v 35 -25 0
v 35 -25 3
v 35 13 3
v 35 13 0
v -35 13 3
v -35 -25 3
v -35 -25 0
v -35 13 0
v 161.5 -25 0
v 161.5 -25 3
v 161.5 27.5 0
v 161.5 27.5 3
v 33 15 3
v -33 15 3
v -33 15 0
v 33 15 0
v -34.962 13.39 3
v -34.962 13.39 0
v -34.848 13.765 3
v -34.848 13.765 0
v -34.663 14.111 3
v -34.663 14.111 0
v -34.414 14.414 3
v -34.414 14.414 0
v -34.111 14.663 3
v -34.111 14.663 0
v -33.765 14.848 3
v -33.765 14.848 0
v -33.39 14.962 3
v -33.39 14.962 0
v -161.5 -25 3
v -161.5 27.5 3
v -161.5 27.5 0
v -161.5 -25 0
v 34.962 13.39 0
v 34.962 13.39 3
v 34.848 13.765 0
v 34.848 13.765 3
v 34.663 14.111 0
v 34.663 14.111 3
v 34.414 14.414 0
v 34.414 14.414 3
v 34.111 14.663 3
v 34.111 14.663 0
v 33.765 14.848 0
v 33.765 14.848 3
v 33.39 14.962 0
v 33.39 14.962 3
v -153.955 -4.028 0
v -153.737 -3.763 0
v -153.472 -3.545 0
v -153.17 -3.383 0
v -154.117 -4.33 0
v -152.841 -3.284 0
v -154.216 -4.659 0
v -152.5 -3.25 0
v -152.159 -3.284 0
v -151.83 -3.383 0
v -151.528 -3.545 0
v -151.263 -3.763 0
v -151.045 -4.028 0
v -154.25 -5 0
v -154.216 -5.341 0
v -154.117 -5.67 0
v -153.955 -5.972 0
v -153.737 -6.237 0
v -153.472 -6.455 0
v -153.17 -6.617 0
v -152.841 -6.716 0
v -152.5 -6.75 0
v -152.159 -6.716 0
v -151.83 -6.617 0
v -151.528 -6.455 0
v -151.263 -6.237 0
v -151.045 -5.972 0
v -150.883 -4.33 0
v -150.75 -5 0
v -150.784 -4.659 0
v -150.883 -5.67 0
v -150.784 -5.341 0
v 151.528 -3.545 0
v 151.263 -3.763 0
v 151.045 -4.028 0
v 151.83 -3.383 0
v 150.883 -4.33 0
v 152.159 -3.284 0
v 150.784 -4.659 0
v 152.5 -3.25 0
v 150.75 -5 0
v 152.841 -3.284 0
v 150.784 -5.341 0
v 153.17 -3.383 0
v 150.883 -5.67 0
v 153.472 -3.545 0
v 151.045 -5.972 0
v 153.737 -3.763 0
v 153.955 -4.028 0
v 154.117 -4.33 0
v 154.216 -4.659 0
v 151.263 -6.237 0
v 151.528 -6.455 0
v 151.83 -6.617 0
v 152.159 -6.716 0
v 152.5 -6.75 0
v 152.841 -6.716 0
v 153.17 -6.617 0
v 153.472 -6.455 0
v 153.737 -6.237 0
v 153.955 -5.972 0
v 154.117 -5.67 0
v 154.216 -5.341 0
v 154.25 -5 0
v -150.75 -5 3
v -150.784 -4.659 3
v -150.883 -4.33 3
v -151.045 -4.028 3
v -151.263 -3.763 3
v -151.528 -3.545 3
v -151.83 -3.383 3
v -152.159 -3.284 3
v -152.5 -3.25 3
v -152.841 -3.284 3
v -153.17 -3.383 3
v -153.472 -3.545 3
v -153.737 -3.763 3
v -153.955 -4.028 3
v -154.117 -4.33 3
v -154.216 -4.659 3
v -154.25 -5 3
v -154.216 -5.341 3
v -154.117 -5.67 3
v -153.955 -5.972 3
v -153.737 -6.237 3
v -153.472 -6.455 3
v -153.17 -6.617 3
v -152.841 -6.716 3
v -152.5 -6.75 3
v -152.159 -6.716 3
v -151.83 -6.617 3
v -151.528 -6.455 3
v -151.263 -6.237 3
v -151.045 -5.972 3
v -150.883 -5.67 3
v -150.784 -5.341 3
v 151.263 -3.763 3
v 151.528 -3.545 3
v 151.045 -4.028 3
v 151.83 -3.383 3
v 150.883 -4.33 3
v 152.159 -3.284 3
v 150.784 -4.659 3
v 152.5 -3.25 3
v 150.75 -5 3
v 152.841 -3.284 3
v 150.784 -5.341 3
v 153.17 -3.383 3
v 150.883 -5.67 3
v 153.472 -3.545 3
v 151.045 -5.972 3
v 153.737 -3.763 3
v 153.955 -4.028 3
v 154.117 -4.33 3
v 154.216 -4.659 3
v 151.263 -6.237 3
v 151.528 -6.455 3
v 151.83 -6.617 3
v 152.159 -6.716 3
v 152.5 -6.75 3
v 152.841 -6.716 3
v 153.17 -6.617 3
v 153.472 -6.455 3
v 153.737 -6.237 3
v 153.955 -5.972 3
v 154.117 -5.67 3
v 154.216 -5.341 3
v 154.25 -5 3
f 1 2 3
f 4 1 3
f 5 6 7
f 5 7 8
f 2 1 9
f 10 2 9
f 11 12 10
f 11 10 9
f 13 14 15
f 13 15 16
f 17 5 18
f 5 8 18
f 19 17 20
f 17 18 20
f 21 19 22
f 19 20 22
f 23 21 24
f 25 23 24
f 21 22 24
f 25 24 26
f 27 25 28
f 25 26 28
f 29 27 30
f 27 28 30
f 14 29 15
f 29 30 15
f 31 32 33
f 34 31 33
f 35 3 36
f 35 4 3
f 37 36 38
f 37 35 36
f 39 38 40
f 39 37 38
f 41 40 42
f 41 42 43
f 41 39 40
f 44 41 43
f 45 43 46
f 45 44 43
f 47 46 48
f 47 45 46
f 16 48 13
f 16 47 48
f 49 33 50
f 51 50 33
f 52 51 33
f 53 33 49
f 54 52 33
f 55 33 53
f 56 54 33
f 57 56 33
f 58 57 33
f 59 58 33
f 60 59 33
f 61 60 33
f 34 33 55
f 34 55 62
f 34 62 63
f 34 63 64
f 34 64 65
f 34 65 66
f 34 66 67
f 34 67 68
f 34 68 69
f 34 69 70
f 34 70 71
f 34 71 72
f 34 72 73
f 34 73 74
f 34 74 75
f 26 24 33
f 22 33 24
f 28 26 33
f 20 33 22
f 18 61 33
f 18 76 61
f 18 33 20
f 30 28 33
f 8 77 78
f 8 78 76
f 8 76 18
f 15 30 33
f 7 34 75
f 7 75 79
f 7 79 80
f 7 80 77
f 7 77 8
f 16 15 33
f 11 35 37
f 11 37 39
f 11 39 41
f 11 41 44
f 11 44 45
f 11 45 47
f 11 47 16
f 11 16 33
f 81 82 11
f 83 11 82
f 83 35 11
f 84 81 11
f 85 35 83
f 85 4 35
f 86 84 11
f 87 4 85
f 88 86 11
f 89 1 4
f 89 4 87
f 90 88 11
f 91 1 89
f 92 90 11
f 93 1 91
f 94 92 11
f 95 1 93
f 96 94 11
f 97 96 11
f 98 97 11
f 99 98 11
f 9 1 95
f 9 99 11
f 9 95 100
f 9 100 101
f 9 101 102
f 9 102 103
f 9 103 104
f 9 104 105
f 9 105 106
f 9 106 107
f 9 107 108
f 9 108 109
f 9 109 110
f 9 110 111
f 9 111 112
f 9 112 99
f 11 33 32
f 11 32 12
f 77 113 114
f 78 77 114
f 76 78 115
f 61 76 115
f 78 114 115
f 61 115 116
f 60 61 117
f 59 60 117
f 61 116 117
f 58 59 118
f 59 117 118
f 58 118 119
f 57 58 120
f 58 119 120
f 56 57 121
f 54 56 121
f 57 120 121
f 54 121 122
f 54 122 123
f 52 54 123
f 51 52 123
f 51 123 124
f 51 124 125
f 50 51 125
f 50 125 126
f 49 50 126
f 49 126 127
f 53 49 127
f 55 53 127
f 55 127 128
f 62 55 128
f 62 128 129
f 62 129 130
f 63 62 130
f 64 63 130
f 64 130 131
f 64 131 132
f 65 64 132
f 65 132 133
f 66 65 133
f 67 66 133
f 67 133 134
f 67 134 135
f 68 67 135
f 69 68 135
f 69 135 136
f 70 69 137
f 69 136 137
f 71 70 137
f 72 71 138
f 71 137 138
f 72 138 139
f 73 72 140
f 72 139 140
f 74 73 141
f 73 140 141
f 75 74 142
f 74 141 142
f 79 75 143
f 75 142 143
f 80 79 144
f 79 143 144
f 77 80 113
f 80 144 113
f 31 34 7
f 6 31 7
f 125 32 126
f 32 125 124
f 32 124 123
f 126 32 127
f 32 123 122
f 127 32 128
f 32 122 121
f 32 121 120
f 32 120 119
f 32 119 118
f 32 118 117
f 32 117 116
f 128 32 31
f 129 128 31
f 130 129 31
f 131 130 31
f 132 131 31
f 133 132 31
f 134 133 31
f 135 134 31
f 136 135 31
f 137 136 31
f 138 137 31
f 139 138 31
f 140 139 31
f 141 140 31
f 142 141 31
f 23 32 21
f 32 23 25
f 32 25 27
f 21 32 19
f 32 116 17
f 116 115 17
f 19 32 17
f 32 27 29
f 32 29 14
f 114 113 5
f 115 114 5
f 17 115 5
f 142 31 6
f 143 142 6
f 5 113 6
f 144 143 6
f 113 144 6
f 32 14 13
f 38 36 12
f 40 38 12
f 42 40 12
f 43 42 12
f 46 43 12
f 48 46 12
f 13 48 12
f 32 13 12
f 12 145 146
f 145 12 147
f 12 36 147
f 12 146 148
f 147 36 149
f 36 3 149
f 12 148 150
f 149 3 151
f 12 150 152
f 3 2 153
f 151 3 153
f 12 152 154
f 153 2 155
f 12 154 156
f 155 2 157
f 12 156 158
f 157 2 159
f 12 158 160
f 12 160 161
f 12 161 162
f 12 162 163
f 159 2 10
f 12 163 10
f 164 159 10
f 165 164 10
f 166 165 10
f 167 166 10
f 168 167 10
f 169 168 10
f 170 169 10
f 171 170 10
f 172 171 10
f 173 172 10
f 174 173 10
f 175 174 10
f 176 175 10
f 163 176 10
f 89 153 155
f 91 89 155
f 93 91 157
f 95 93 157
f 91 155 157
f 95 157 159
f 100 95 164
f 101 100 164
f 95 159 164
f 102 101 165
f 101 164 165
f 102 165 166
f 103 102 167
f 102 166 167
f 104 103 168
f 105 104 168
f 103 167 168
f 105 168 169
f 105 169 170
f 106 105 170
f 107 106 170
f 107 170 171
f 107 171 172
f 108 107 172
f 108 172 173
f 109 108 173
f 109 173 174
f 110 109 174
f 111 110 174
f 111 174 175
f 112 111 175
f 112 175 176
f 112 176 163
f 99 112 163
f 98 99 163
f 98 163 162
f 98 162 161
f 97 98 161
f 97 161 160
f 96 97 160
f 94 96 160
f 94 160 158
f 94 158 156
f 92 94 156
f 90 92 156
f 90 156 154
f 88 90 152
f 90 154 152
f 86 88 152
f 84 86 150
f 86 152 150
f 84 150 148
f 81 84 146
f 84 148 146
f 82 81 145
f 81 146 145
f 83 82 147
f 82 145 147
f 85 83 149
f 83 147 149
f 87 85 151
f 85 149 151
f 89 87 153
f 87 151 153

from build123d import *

# Parameters (mm, degrees)
SKETCH1_W               = 323
SKETCH1_H               = 50
BOSS_EXTRUDE1_DEPTH     = 3
SKETCH2_W               = 70
SKETCH2_H               = 40
CUT_EXTRUDE1_DEPTH      = 1
CUT_EXTRUDE1_DEPTH_BACK = 4
FILLET1_R               = 2
SKETCH3_W               = 323
SKETCH3_H               = 3
BOSS_EXTRUDE2_DEPTH     = 2.5
SKETCH4_R               = 1.75
CUT_EXTRUDE2_DEPTH      = 4


with BuildPart() as part:
    # Sketch1 → Boss-Extrude1 (new body)
    with BuildSketch(Plane.XY):
        Rectangle(SKETCH1_W, SKETCH1_H)
    extrude(amount=BOSS_EXTRUDE1_DEPTH)

    # Sketch2 → Cut-Extrude1 (cut, two sides)
    with BuildSketch(Plane.XY.offset(3)) as cut_extrude1_sk:
        with Locations((0, -5)):
            Rectangle(SKETCH2_W, SKETCH2_H)
    extrude(amount=CUT_EXTRUDE1_DEPTH, mode=Mode.SUBTRACT)
    extrude(cut_extrude1_sk.sketch, amount=-CUT_EXTRUDE1_DEPTH_BACK, mode=Mode.SUBTRACT)

    # Fillet1
    fillet1_edges = [part.edges().sort_by_distance(p)[0] for p in [
        (-35, 15, 1.5),
        (35, 15, 1.5),
    ]]
    fillet(fillet1_edges, radius=FILLET1_R)

    # Sketch3 → Boss-Extrude2 (add)
    with BuildSketch(Plane(origin=(0, 25, 0), x_dir=(1, 0, 0), z_dir=(0, 1, 0))):
        with Locations((0, -1.5)):
            Rectangle(SKETCH3_W, SKETCH3_H)
    extrude(amount=BOSS_EXTRUDE2_DEPTH)

    # Sketch4 → Cut-Extrude2 (cut, through all)
    with BuildSketch(Plane.XY.offset(3)):
        with Locations((-152.5, -5)):
            Circle(SKETCH4_R)
        with Locations(Location((152.5, -5, 0), (0, 0, 180))):  # turned: the seam where the file's is
            Circle(SKETCH4_R)
    extrude(amount=-CUT_EXTRUDE2_DEPTH, mode=Mode.SUBTRACT)


solid = part.part
